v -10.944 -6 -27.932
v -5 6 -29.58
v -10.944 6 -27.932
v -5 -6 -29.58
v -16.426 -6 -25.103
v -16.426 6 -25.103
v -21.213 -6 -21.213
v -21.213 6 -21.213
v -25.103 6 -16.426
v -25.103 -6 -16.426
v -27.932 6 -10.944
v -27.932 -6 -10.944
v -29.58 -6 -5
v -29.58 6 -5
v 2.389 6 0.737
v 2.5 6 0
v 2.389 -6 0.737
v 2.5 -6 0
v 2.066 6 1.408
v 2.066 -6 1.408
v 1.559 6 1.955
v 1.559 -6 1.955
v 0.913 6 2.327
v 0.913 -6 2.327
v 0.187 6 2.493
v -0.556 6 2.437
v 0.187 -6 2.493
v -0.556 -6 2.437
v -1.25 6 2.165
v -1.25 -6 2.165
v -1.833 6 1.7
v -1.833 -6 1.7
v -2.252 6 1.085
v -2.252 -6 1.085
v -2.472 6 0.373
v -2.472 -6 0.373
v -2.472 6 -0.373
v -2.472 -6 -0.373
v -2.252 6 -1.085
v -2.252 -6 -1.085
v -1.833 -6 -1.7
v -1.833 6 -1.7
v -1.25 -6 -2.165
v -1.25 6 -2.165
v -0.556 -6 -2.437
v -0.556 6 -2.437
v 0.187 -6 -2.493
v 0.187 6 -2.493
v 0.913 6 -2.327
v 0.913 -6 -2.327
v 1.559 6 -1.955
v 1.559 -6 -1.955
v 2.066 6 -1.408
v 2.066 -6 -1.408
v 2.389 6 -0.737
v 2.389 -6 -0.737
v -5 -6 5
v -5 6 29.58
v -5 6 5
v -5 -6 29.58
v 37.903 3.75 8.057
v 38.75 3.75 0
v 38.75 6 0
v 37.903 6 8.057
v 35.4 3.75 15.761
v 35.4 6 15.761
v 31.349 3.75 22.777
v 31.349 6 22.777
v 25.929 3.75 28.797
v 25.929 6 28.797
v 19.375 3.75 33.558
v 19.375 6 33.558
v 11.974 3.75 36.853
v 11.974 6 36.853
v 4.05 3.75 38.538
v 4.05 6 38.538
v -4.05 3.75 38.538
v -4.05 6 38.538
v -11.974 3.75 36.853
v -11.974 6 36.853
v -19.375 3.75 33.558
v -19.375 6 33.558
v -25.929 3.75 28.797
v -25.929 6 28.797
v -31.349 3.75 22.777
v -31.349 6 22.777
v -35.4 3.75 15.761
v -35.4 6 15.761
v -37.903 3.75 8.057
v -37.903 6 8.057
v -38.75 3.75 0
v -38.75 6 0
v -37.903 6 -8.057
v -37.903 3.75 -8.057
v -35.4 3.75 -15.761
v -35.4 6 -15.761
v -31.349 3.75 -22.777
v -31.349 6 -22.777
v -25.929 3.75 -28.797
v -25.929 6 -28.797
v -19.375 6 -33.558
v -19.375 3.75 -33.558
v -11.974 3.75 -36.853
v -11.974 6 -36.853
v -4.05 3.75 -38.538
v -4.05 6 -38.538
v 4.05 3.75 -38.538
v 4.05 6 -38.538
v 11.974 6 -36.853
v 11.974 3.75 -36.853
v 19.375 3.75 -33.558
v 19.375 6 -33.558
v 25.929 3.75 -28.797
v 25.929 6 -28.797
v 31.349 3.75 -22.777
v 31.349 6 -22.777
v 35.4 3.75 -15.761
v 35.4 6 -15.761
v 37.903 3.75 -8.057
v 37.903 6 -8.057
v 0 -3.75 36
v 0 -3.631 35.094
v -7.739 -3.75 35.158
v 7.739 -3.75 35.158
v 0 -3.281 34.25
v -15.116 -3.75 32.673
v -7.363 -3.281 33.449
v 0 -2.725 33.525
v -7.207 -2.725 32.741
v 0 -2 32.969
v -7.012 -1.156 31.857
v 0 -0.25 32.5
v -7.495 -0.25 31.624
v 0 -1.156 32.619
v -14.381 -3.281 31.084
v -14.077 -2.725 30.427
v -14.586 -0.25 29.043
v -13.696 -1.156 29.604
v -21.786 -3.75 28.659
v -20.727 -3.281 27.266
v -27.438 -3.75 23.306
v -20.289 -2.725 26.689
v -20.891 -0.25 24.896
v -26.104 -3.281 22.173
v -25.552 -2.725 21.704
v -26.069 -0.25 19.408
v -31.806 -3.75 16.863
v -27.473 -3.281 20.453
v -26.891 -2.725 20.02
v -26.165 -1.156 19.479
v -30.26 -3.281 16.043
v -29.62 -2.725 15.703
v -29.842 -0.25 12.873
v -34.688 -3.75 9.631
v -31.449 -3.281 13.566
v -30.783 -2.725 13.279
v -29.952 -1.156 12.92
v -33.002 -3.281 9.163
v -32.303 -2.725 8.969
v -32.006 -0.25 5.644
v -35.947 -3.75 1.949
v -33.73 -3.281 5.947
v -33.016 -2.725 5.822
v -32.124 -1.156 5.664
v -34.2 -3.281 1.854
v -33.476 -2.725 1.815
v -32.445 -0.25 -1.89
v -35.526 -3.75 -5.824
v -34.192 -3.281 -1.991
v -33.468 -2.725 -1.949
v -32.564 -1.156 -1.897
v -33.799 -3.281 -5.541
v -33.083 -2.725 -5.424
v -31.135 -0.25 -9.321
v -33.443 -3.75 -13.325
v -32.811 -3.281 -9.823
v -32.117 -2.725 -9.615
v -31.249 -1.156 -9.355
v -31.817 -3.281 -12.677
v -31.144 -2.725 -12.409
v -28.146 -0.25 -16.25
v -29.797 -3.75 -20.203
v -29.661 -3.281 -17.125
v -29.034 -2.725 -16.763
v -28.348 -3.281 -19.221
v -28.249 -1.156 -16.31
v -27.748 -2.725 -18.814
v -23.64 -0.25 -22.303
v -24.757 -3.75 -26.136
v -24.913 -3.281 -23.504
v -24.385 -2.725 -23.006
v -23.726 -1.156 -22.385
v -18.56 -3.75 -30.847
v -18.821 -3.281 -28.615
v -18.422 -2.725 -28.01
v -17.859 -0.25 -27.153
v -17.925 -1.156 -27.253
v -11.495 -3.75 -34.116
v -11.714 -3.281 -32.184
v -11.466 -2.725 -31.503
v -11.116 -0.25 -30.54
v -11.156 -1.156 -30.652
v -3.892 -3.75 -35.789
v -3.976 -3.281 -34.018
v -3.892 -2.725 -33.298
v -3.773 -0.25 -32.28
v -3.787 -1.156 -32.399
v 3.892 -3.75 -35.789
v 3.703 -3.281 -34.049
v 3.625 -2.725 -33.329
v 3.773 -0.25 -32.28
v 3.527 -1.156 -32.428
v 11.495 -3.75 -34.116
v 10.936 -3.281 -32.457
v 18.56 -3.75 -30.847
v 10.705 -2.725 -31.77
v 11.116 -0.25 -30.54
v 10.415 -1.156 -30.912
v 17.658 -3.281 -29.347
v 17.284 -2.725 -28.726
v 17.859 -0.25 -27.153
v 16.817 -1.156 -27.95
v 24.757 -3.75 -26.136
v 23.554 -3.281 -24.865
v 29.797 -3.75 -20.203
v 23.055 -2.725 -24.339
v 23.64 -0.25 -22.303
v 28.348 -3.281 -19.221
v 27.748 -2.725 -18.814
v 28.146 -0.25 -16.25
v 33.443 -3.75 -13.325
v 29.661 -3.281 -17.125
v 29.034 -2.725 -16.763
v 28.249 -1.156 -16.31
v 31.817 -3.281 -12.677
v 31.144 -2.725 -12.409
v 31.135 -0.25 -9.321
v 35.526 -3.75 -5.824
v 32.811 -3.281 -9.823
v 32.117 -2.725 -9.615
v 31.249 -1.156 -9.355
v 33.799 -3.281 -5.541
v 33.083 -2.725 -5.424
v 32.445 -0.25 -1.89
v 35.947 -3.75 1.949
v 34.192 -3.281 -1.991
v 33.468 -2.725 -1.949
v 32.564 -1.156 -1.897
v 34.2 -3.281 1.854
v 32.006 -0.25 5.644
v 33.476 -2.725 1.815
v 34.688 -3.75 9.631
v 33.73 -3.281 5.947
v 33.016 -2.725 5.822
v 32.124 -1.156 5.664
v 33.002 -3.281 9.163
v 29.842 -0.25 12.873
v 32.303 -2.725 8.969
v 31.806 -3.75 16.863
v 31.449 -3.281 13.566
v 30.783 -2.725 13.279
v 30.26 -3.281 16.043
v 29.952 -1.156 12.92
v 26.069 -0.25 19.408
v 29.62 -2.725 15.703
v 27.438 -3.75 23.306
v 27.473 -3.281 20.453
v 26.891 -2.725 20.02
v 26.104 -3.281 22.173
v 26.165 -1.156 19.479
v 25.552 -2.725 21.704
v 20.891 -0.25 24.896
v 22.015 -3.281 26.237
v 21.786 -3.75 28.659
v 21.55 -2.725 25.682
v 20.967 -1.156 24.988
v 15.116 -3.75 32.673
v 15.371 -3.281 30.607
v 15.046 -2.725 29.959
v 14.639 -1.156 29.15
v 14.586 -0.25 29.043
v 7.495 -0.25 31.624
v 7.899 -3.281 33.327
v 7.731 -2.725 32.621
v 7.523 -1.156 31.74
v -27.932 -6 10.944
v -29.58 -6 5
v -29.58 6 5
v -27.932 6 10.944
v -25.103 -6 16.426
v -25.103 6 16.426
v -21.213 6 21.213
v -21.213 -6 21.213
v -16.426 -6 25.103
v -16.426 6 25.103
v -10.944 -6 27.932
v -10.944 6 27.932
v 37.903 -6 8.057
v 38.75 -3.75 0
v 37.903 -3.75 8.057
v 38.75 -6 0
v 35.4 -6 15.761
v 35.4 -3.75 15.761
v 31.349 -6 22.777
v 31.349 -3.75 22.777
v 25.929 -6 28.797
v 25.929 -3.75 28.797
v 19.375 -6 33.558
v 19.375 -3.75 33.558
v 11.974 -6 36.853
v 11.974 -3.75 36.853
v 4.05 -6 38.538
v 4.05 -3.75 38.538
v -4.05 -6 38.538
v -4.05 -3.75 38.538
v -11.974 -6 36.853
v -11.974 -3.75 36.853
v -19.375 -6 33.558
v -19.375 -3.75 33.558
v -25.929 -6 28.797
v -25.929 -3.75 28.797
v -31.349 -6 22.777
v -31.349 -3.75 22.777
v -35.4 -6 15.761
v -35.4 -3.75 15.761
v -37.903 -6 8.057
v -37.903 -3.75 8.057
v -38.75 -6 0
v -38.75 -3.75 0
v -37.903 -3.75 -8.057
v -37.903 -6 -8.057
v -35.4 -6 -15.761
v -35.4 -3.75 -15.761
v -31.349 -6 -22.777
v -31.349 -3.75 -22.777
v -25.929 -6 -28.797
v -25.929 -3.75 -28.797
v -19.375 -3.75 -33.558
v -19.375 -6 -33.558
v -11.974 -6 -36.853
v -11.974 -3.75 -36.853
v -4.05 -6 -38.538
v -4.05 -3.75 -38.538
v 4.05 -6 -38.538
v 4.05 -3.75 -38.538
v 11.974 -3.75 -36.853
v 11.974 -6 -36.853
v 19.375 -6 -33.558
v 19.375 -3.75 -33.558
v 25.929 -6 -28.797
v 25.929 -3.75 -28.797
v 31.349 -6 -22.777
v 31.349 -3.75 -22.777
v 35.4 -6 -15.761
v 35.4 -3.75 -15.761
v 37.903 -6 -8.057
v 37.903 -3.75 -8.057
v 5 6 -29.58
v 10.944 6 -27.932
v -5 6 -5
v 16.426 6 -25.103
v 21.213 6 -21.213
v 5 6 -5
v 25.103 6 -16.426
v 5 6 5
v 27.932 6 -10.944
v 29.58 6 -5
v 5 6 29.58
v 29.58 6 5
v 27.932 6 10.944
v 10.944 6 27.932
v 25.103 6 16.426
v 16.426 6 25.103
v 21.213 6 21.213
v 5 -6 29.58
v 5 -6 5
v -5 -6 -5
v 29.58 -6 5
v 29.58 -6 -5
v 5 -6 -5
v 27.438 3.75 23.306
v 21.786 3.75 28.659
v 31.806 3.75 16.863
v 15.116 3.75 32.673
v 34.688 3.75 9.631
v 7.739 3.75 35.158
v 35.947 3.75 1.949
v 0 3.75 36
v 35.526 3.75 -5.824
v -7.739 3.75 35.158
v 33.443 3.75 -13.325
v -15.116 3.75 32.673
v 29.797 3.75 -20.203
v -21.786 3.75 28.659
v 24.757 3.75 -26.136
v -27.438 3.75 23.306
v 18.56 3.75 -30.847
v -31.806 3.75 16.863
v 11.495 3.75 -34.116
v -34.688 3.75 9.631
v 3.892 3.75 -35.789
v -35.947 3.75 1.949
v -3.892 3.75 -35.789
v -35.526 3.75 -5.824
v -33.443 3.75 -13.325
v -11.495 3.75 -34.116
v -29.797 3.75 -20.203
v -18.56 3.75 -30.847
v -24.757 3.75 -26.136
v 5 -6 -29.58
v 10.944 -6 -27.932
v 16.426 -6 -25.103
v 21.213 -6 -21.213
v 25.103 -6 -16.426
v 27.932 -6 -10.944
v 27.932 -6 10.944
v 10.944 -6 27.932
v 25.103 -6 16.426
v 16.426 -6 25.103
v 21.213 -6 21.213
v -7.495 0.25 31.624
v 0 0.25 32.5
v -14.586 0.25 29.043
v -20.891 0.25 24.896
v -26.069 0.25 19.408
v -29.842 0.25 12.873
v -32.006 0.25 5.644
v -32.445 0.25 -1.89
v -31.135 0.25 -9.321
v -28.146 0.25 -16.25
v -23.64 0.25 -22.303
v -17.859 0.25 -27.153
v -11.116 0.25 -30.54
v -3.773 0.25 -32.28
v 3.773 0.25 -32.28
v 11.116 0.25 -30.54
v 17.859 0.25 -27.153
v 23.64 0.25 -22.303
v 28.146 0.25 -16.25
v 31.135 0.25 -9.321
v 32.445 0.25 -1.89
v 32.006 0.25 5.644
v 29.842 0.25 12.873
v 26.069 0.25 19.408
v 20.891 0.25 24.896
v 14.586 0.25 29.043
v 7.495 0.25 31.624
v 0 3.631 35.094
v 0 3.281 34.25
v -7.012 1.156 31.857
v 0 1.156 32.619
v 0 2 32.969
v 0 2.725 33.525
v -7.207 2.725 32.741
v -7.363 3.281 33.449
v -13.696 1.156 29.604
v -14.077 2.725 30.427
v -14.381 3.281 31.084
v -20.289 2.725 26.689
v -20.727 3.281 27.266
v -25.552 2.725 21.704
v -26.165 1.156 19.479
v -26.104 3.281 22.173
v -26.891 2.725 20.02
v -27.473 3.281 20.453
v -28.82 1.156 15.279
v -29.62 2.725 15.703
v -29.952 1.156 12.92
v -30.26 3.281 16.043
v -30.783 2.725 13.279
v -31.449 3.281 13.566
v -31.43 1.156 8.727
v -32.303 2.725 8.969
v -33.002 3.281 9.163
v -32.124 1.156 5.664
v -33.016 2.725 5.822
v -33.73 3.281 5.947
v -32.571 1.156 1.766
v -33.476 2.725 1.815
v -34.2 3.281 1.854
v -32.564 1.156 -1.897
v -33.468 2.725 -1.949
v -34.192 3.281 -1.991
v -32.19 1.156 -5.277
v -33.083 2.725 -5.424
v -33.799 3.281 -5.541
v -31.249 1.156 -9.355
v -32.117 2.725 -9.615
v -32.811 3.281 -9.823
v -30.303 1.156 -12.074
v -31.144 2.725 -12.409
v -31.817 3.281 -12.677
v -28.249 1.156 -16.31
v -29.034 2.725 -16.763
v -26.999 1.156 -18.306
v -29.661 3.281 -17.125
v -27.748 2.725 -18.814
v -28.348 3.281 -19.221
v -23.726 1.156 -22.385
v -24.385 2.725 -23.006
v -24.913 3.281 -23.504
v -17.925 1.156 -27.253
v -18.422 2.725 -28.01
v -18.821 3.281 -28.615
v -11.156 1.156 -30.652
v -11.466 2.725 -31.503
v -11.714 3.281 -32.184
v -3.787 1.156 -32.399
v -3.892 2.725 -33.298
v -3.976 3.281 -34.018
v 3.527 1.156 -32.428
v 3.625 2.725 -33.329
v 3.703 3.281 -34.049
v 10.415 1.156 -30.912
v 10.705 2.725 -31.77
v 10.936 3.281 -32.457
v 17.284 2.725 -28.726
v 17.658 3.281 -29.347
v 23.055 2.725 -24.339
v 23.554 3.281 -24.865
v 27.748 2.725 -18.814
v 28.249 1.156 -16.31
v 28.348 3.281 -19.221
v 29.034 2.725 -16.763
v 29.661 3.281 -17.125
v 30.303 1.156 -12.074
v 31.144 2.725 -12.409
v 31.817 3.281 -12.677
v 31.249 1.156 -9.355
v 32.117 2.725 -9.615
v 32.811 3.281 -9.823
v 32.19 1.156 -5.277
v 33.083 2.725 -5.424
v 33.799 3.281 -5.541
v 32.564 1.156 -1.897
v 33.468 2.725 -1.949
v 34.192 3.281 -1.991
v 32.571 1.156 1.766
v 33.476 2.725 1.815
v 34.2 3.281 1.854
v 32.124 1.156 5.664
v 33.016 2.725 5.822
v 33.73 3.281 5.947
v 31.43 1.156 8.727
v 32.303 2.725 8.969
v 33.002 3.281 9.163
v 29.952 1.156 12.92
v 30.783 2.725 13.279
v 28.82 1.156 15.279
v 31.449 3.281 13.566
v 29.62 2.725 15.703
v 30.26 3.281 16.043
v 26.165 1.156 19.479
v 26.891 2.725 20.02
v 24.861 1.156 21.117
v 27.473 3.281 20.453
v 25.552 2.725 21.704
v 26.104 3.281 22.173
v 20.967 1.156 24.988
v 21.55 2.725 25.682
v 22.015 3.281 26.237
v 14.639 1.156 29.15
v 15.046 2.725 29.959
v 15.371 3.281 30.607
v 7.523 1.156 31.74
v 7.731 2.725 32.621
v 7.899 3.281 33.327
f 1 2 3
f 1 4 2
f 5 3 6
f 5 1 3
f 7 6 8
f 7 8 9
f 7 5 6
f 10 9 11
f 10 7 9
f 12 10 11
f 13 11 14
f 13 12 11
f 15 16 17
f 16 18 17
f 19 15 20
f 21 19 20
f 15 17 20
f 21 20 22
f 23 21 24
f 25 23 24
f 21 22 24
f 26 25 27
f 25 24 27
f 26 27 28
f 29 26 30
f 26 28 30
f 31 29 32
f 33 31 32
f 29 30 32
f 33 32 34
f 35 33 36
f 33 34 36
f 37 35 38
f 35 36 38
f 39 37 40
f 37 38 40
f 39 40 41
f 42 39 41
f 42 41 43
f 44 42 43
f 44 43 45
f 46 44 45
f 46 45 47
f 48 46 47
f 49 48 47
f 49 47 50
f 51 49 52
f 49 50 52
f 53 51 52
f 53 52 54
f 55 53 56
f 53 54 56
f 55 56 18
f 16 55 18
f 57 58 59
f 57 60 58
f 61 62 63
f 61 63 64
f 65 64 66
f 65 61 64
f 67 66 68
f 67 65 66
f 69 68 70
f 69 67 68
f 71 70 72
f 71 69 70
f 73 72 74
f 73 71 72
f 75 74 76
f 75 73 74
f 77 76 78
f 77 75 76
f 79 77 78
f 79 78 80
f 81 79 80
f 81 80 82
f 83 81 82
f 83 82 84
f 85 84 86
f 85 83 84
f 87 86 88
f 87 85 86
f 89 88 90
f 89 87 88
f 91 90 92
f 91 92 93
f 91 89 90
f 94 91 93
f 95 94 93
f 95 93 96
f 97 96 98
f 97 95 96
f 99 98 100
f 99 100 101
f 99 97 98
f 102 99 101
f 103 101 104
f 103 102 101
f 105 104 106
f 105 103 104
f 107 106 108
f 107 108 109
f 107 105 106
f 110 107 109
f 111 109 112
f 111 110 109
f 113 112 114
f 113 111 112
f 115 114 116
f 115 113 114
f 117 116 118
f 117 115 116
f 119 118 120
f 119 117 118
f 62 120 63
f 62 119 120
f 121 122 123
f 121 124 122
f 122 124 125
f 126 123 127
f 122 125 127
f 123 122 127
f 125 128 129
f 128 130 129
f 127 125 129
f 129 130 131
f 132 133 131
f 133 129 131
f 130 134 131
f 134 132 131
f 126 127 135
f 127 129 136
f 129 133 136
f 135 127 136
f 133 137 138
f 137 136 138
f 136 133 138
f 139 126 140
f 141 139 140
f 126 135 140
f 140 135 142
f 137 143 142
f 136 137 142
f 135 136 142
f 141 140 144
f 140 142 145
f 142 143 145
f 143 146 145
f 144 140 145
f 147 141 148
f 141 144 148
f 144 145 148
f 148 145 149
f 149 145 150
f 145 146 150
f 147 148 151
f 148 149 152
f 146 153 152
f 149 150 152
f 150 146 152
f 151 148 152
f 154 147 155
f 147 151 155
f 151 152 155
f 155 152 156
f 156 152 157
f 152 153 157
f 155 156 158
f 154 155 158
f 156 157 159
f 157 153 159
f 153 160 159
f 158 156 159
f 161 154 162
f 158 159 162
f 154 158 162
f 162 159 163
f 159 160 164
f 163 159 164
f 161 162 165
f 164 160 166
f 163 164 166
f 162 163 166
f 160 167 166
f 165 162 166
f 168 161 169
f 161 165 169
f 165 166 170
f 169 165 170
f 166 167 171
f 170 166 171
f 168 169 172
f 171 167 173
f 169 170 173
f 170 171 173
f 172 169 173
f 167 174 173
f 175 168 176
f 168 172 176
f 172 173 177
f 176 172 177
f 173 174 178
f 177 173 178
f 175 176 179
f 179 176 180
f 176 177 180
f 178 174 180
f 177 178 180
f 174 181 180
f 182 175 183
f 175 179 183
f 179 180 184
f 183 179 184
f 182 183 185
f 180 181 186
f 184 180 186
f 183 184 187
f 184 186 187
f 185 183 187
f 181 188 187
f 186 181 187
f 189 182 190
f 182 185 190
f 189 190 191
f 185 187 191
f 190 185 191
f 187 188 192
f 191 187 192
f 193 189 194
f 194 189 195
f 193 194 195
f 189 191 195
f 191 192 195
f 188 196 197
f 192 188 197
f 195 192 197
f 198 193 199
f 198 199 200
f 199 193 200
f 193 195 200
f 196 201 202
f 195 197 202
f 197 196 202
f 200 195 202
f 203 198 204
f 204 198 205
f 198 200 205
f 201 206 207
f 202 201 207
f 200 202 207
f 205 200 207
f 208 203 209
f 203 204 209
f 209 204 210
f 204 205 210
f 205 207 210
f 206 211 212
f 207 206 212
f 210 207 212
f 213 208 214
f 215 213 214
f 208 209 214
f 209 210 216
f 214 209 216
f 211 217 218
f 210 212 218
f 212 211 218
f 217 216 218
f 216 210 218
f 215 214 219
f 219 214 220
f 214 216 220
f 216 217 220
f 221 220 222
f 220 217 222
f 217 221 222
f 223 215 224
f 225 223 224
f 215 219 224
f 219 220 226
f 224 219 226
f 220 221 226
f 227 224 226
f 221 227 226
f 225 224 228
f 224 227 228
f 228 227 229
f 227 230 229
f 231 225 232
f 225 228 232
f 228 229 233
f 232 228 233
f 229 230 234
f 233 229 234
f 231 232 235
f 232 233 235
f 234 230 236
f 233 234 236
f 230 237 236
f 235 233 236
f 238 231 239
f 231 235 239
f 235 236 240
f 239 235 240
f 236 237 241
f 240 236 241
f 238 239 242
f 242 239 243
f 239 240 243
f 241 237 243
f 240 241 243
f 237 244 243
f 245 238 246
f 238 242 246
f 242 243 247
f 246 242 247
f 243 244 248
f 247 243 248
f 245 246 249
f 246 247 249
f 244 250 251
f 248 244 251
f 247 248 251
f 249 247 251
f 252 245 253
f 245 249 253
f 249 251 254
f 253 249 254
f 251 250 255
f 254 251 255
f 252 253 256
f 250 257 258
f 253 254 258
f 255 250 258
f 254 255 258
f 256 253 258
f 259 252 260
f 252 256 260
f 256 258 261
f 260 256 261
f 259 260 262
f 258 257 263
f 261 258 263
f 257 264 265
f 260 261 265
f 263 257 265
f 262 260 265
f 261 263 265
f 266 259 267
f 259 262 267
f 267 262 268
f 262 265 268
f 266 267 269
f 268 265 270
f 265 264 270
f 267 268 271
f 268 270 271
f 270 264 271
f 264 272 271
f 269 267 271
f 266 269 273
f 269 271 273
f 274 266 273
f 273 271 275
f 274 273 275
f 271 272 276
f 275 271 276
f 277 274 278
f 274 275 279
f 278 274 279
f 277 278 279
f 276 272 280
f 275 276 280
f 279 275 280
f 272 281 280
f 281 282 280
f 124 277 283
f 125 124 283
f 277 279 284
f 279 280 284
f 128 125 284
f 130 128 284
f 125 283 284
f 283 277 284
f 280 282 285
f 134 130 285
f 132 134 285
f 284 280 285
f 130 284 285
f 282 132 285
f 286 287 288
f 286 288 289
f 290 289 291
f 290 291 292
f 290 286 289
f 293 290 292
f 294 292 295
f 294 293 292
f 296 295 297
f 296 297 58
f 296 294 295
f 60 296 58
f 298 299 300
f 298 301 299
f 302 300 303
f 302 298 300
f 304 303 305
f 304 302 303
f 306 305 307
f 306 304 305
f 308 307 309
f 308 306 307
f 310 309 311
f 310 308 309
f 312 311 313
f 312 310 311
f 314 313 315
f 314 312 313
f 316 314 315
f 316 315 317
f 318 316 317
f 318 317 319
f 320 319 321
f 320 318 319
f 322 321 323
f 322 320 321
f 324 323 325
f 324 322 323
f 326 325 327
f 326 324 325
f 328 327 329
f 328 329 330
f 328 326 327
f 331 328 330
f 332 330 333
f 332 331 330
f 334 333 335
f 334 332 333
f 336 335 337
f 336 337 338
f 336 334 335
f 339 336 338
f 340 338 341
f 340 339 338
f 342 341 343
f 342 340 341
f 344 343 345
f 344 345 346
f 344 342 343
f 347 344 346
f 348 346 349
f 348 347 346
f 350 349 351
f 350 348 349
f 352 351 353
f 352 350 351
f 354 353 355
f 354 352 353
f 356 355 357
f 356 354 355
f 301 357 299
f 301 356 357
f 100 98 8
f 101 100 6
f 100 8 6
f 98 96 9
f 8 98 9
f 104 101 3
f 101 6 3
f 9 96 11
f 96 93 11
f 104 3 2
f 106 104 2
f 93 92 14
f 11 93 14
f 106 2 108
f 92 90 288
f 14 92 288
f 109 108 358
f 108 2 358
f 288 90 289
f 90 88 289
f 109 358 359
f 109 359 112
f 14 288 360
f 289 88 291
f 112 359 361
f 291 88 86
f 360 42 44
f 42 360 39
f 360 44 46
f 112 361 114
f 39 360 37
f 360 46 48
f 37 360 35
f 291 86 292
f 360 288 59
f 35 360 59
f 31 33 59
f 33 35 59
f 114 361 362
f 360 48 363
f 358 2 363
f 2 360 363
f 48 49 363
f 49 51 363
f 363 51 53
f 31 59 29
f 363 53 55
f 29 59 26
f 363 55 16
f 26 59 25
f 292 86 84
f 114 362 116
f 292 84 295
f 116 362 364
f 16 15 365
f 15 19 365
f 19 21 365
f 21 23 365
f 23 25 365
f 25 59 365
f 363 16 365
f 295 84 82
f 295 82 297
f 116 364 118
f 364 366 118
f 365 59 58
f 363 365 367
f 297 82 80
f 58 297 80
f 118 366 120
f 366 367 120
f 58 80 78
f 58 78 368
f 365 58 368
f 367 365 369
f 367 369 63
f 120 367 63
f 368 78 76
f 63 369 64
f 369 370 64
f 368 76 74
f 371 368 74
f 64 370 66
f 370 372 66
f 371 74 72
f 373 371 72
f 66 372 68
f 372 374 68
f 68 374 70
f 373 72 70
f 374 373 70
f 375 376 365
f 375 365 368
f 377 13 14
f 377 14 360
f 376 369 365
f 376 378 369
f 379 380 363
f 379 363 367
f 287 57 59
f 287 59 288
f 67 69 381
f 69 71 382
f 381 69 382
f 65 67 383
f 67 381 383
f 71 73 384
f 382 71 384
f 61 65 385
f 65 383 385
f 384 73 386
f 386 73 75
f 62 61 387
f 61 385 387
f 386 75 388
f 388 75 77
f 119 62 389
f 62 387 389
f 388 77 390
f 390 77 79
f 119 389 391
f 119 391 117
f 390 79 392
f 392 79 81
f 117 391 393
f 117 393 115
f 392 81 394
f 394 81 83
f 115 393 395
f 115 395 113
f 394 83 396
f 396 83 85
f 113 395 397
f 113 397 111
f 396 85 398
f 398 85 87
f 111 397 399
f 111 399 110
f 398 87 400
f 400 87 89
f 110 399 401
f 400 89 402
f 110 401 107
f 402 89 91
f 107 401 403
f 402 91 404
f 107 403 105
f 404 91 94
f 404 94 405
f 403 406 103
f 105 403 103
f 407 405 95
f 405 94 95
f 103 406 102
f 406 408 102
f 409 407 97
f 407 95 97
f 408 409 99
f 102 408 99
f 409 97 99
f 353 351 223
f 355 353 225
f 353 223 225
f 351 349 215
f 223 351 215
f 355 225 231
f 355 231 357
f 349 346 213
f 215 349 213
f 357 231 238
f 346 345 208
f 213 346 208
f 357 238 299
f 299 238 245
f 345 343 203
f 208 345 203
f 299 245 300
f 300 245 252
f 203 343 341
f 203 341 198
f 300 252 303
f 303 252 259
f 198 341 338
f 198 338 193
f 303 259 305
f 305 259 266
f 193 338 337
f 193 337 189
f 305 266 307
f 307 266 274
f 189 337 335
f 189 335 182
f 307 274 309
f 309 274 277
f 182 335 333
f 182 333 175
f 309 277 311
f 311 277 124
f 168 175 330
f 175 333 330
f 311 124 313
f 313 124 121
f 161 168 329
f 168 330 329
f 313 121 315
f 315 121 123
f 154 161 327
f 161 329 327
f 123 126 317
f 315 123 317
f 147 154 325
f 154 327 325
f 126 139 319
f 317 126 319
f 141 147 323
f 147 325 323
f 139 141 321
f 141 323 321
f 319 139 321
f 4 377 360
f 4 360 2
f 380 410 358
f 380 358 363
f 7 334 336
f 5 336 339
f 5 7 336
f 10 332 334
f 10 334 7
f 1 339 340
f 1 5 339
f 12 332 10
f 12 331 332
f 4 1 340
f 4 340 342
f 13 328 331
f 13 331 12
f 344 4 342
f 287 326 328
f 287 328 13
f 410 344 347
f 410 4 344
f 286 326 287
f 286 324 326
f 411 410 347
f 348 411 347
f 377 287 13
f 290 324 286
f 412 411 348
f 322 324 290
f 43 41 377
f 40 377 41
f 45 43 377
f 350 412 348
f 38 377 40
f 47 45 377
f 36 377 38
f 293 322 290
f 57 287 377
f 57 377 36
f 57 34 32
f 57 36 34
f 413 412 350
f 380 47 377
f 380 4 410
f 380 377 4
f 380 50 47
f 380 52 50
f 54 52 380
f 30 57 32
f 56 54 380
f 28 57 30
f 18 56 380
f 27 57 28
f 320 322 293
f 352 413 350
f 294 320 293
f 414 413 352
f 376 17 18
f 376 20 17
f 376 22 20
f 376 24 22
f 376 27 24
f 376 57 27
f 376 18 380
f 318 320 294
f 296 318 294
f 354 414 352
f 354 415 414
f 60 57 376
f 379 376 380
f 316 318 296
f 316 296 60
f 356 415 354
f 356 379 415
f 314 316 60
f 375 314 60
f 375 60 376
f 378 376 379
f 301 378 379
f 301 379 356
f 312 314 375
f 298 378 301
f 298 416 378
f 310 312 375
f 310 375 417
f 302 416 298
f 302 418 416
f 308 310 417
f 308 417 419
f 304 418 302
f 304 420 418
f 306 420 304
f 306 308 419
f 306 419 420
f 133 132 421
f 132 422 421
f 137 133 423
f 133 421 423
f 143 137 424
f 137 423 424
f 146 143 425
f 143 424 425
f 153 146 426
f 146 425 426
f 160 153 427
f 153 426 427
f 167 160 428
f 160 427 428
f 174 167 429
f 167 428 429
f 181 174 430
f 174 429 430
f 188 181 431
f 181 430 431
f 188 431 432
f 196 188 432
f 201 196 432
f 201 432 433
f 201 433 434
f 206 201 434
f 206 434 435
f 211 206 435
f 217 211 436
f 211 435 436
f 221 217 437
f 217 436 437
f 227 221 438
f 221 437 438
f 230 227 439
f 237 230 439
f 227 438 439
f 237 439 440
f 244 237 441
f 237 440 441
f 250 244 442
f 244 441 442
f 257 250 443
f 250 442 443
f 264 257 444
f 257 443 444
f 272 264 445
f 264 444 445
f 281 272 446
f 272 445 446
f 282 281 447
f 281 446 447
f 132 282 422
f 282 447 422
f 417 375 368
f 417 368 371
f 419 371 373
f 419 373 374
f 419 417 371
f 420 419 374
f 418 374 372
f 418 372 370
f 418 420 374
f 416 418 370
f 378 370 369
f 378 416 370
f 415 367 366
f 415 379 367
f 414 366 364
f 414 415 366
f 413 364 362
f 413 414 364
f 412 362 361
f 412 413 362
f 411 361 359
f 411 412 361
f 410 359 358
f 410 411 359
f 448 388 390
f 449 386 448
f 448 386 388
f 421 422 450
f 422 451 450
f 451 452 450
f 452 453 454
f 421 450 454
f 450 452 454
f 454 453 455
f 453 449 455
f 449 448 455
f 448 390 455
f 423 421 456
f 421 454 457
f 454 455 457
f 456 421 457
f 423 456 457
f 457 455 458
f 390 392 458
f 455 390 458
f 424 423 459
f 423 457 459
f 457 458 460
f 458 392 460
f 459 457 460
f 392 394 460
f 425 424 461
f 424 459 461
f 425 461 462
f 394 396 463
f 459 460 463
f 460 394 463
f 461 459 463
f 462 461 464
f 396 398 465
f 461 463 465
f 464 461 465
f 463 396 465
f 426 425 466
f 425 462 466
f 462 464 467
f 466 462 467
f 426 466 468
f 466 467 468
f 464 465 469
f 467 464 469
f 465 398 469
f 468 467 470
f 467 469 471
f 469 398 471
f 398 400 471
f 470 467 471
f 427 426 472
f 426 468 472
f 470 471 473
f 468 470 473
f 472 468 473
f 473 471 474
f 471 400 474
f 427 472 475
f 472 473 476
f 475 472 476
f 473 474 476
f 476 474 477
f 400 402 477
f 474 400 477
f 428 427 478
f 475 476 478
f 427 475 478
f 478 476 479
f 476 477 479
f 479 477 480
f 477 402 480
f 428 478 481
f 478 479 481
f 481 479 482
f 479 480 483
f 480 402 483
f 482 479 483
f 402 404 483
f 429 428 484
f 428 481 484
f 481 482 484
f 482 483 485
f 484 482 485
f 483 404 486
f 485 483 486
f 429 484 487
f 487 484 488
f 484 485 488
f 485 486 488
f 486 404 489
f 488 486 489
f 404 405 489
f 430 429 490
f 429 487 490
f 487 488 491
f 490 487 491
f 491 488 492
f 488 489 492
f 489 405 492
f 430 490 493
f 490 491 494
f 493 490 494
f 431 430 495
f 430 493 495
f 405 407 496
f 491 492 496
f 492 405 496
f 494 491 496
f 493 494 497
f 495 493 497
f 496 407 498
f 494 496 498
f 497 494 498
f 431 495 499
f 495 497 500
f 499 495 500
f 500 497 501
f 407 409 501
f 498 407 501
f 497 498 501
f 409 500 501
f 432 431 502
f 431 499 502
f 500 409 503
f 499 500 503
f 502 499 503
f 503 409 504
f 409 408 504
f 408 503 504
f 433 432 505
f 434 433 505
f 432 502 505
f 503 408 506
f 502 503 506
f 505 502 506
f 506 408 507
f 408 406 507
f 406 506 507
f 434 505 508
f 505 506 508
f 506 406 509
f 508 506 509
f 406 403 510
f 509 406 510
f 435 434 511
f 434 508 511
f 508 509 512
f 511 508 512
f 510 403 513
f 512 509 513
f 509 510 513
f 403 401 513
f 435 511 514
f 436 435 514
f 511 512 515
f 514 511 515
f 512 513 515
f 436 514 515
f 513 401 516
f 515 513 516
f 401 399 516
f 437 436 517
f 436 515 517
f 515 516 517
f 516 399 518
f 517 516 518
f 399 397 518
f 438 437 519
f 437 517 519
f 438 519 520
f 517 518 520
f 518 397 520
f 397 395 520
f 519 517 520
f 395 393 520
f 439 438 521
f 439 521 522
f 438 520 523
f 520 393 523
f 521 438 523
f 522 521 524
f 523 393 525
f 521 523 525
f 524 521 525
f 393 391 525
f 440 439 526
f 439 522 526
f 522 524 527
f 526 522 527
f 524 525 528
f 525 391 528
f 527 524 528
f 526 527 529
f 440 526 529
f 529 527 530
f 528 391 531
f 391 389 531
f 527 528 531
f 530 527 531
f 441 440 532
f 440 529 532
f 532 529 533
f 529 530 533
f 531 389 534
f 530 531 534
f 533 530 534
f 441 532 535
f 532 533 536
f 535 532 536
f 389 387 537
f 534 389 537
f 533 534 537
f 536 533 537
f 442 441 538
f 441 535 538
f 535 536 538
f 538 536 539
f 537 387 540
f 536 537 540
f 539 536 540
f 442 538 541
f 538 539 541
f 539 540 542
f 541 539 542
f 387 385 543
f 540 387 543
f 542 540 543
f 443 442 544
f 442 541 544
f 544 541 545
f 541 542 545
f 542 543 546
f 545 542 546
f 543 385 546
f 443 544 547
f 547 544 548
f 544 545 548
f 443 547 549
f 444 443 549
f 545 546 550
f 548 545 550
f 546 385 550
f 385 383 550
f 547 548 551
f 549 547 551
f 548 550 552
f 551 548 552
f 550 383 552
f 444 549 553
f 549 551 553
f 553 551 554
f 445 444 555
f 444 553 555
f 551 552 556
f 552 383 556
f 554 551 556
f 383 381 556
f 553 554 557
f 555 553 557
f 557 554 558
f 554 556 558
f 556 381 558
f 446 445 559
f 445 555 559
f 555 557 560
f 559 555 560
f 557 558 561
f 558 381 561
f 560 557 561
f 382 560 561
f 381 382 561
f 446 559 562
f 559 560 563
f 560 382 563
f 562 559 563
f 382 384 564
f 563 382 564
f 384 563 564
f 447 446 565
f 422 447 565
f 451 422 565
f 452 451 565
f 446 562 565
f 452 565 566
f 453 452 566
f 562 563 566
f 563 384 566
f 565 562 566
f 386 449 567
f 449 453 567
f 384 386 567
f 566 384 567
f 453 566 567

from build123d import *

# Parameters (mm, degrees)
F0_R     = 38.75
F0_W     = 10
F0_H     = 10
F3_DEPTH = 6
F5_R     = 2.5
F6_DEPTH = 12.5


with BuildPart() as f3:
    # F0 (on Front) → F3 (new body, symmetric)
    with BuildSketch(Plane.XZ):
        Circle(F0_R)
        with BuildLine():
            ThreePointArc((29.5803989155, 5), (29.8949156836, 2.5087878084), (30, 0))
            ThreePointArc((30, 0), (29.8949156836, -2.5087878084), (29.5803989155, -5))
            ThreePointArc((29.5803989155, -5), (21.2132034356, -21.2132034356), (5, -29.5803989155))
            ThreePointArc((5, -29.5803989155), (0, -30), (-5, -29.5803989155))
            ThreePointArc((-5, -29.5803989155), (-21.2132034356, -21.2132034356), (-29.5803989155, -5))
            ThreePointArc((-29.5803989155, -5), (-30, 0), (-29.5803989155, 5))
            ThreePointArc((-29.5803989155, 5), (-21.2132034356, 21.2132034356), (-5, 29.5803989155))
            ThreePointArc((-5, 29.5803989155), (0, 30), (5, 29.5803989155))
            ThreePointArc((5, 29.5803989155), (21.2132034356, 21.2132034356), (29.5803989155, 5))
        make_face(mode=Mode.SUBTRACT)
        with BuildLine():
            Line((5, 5), (5, 29.5803989155))
            ThreePointArc((5, 29.5803989155), (0, 30), (-5, 29.5803989155))
            Line((-5, 29.5803989155), (-5, 5))
            Line((-5, 5), (5, 5))
        make_face()
        with BuildLine():
            ThreePointArc((29.5803989155, -5), (29.8949156836, -2.5087878084), (30, 0))
            ThreePointArc((30, 0), (29.8949156836, 2.5087878084), (29.5803989155, 5))
            Line((29.5803989155, 5), (5, 5))
            Line((5, 5), (5, -5))
            Line((5, -5), (29.5803989155, -5))
        make_face()
        Rectangle(F0_W, F0_H)
        with BuildLine():
            Line((-5, -5), (-5, 5))
            Line((-5, 5), (-29.5803989155, 5))
            ThreePointArc((-29.5803989155, 5), (-30, 0), (-29.5803989155, -5))
            Line((-29.5803989155, -5), (-5, -5))
        make_face()
        with BuildLine():
            ThreePointArc((-5, -29.5803989155), (0, -30), (5, -29.5803989155))
            Line((5, -29.5803989155), (5, -5))
            Line((5, -5), (-5, -5))
            Line((-5, -5), (-5, -29.5803989155))
        make_face()
    extrude(amount=F3_DEPTH, both=True)

    # F1 (on Right) → F4 (revolve, cut)
    with BuildSketch(Plane.YZ):
        with BuildLine():
            Line((3.75, 36), (3.75, 40))
            Line((3.75, 40), (-3.75, 40))
            Line((-3.75, 40), (-3.75, 36))
            ThreePointArc((-3.75, 36), (-2.7248737342, 33.5251262658), (-0.25, 32.5))
            Line((-0.25, 32.5), (0.25, 32.5))
            ThreePointArc((0.25, 32.5), (2.7248737342, 33.5251262658), (3.75, 36))
        make_face()
    revolve(axis=Axis((0, -2.0112972707, 0), (0, -1, 0)), mode=Mode.SUBTRACT)

    # F5 (on Front) → F6 (cut, symmetric)
    with BuildSketch(Plane.XZ):
        Circle(F5_R)
    extrude(amount=F6_DEPTH, both=True, mode=Mode.SUBTRACT)


solid = f3.part
